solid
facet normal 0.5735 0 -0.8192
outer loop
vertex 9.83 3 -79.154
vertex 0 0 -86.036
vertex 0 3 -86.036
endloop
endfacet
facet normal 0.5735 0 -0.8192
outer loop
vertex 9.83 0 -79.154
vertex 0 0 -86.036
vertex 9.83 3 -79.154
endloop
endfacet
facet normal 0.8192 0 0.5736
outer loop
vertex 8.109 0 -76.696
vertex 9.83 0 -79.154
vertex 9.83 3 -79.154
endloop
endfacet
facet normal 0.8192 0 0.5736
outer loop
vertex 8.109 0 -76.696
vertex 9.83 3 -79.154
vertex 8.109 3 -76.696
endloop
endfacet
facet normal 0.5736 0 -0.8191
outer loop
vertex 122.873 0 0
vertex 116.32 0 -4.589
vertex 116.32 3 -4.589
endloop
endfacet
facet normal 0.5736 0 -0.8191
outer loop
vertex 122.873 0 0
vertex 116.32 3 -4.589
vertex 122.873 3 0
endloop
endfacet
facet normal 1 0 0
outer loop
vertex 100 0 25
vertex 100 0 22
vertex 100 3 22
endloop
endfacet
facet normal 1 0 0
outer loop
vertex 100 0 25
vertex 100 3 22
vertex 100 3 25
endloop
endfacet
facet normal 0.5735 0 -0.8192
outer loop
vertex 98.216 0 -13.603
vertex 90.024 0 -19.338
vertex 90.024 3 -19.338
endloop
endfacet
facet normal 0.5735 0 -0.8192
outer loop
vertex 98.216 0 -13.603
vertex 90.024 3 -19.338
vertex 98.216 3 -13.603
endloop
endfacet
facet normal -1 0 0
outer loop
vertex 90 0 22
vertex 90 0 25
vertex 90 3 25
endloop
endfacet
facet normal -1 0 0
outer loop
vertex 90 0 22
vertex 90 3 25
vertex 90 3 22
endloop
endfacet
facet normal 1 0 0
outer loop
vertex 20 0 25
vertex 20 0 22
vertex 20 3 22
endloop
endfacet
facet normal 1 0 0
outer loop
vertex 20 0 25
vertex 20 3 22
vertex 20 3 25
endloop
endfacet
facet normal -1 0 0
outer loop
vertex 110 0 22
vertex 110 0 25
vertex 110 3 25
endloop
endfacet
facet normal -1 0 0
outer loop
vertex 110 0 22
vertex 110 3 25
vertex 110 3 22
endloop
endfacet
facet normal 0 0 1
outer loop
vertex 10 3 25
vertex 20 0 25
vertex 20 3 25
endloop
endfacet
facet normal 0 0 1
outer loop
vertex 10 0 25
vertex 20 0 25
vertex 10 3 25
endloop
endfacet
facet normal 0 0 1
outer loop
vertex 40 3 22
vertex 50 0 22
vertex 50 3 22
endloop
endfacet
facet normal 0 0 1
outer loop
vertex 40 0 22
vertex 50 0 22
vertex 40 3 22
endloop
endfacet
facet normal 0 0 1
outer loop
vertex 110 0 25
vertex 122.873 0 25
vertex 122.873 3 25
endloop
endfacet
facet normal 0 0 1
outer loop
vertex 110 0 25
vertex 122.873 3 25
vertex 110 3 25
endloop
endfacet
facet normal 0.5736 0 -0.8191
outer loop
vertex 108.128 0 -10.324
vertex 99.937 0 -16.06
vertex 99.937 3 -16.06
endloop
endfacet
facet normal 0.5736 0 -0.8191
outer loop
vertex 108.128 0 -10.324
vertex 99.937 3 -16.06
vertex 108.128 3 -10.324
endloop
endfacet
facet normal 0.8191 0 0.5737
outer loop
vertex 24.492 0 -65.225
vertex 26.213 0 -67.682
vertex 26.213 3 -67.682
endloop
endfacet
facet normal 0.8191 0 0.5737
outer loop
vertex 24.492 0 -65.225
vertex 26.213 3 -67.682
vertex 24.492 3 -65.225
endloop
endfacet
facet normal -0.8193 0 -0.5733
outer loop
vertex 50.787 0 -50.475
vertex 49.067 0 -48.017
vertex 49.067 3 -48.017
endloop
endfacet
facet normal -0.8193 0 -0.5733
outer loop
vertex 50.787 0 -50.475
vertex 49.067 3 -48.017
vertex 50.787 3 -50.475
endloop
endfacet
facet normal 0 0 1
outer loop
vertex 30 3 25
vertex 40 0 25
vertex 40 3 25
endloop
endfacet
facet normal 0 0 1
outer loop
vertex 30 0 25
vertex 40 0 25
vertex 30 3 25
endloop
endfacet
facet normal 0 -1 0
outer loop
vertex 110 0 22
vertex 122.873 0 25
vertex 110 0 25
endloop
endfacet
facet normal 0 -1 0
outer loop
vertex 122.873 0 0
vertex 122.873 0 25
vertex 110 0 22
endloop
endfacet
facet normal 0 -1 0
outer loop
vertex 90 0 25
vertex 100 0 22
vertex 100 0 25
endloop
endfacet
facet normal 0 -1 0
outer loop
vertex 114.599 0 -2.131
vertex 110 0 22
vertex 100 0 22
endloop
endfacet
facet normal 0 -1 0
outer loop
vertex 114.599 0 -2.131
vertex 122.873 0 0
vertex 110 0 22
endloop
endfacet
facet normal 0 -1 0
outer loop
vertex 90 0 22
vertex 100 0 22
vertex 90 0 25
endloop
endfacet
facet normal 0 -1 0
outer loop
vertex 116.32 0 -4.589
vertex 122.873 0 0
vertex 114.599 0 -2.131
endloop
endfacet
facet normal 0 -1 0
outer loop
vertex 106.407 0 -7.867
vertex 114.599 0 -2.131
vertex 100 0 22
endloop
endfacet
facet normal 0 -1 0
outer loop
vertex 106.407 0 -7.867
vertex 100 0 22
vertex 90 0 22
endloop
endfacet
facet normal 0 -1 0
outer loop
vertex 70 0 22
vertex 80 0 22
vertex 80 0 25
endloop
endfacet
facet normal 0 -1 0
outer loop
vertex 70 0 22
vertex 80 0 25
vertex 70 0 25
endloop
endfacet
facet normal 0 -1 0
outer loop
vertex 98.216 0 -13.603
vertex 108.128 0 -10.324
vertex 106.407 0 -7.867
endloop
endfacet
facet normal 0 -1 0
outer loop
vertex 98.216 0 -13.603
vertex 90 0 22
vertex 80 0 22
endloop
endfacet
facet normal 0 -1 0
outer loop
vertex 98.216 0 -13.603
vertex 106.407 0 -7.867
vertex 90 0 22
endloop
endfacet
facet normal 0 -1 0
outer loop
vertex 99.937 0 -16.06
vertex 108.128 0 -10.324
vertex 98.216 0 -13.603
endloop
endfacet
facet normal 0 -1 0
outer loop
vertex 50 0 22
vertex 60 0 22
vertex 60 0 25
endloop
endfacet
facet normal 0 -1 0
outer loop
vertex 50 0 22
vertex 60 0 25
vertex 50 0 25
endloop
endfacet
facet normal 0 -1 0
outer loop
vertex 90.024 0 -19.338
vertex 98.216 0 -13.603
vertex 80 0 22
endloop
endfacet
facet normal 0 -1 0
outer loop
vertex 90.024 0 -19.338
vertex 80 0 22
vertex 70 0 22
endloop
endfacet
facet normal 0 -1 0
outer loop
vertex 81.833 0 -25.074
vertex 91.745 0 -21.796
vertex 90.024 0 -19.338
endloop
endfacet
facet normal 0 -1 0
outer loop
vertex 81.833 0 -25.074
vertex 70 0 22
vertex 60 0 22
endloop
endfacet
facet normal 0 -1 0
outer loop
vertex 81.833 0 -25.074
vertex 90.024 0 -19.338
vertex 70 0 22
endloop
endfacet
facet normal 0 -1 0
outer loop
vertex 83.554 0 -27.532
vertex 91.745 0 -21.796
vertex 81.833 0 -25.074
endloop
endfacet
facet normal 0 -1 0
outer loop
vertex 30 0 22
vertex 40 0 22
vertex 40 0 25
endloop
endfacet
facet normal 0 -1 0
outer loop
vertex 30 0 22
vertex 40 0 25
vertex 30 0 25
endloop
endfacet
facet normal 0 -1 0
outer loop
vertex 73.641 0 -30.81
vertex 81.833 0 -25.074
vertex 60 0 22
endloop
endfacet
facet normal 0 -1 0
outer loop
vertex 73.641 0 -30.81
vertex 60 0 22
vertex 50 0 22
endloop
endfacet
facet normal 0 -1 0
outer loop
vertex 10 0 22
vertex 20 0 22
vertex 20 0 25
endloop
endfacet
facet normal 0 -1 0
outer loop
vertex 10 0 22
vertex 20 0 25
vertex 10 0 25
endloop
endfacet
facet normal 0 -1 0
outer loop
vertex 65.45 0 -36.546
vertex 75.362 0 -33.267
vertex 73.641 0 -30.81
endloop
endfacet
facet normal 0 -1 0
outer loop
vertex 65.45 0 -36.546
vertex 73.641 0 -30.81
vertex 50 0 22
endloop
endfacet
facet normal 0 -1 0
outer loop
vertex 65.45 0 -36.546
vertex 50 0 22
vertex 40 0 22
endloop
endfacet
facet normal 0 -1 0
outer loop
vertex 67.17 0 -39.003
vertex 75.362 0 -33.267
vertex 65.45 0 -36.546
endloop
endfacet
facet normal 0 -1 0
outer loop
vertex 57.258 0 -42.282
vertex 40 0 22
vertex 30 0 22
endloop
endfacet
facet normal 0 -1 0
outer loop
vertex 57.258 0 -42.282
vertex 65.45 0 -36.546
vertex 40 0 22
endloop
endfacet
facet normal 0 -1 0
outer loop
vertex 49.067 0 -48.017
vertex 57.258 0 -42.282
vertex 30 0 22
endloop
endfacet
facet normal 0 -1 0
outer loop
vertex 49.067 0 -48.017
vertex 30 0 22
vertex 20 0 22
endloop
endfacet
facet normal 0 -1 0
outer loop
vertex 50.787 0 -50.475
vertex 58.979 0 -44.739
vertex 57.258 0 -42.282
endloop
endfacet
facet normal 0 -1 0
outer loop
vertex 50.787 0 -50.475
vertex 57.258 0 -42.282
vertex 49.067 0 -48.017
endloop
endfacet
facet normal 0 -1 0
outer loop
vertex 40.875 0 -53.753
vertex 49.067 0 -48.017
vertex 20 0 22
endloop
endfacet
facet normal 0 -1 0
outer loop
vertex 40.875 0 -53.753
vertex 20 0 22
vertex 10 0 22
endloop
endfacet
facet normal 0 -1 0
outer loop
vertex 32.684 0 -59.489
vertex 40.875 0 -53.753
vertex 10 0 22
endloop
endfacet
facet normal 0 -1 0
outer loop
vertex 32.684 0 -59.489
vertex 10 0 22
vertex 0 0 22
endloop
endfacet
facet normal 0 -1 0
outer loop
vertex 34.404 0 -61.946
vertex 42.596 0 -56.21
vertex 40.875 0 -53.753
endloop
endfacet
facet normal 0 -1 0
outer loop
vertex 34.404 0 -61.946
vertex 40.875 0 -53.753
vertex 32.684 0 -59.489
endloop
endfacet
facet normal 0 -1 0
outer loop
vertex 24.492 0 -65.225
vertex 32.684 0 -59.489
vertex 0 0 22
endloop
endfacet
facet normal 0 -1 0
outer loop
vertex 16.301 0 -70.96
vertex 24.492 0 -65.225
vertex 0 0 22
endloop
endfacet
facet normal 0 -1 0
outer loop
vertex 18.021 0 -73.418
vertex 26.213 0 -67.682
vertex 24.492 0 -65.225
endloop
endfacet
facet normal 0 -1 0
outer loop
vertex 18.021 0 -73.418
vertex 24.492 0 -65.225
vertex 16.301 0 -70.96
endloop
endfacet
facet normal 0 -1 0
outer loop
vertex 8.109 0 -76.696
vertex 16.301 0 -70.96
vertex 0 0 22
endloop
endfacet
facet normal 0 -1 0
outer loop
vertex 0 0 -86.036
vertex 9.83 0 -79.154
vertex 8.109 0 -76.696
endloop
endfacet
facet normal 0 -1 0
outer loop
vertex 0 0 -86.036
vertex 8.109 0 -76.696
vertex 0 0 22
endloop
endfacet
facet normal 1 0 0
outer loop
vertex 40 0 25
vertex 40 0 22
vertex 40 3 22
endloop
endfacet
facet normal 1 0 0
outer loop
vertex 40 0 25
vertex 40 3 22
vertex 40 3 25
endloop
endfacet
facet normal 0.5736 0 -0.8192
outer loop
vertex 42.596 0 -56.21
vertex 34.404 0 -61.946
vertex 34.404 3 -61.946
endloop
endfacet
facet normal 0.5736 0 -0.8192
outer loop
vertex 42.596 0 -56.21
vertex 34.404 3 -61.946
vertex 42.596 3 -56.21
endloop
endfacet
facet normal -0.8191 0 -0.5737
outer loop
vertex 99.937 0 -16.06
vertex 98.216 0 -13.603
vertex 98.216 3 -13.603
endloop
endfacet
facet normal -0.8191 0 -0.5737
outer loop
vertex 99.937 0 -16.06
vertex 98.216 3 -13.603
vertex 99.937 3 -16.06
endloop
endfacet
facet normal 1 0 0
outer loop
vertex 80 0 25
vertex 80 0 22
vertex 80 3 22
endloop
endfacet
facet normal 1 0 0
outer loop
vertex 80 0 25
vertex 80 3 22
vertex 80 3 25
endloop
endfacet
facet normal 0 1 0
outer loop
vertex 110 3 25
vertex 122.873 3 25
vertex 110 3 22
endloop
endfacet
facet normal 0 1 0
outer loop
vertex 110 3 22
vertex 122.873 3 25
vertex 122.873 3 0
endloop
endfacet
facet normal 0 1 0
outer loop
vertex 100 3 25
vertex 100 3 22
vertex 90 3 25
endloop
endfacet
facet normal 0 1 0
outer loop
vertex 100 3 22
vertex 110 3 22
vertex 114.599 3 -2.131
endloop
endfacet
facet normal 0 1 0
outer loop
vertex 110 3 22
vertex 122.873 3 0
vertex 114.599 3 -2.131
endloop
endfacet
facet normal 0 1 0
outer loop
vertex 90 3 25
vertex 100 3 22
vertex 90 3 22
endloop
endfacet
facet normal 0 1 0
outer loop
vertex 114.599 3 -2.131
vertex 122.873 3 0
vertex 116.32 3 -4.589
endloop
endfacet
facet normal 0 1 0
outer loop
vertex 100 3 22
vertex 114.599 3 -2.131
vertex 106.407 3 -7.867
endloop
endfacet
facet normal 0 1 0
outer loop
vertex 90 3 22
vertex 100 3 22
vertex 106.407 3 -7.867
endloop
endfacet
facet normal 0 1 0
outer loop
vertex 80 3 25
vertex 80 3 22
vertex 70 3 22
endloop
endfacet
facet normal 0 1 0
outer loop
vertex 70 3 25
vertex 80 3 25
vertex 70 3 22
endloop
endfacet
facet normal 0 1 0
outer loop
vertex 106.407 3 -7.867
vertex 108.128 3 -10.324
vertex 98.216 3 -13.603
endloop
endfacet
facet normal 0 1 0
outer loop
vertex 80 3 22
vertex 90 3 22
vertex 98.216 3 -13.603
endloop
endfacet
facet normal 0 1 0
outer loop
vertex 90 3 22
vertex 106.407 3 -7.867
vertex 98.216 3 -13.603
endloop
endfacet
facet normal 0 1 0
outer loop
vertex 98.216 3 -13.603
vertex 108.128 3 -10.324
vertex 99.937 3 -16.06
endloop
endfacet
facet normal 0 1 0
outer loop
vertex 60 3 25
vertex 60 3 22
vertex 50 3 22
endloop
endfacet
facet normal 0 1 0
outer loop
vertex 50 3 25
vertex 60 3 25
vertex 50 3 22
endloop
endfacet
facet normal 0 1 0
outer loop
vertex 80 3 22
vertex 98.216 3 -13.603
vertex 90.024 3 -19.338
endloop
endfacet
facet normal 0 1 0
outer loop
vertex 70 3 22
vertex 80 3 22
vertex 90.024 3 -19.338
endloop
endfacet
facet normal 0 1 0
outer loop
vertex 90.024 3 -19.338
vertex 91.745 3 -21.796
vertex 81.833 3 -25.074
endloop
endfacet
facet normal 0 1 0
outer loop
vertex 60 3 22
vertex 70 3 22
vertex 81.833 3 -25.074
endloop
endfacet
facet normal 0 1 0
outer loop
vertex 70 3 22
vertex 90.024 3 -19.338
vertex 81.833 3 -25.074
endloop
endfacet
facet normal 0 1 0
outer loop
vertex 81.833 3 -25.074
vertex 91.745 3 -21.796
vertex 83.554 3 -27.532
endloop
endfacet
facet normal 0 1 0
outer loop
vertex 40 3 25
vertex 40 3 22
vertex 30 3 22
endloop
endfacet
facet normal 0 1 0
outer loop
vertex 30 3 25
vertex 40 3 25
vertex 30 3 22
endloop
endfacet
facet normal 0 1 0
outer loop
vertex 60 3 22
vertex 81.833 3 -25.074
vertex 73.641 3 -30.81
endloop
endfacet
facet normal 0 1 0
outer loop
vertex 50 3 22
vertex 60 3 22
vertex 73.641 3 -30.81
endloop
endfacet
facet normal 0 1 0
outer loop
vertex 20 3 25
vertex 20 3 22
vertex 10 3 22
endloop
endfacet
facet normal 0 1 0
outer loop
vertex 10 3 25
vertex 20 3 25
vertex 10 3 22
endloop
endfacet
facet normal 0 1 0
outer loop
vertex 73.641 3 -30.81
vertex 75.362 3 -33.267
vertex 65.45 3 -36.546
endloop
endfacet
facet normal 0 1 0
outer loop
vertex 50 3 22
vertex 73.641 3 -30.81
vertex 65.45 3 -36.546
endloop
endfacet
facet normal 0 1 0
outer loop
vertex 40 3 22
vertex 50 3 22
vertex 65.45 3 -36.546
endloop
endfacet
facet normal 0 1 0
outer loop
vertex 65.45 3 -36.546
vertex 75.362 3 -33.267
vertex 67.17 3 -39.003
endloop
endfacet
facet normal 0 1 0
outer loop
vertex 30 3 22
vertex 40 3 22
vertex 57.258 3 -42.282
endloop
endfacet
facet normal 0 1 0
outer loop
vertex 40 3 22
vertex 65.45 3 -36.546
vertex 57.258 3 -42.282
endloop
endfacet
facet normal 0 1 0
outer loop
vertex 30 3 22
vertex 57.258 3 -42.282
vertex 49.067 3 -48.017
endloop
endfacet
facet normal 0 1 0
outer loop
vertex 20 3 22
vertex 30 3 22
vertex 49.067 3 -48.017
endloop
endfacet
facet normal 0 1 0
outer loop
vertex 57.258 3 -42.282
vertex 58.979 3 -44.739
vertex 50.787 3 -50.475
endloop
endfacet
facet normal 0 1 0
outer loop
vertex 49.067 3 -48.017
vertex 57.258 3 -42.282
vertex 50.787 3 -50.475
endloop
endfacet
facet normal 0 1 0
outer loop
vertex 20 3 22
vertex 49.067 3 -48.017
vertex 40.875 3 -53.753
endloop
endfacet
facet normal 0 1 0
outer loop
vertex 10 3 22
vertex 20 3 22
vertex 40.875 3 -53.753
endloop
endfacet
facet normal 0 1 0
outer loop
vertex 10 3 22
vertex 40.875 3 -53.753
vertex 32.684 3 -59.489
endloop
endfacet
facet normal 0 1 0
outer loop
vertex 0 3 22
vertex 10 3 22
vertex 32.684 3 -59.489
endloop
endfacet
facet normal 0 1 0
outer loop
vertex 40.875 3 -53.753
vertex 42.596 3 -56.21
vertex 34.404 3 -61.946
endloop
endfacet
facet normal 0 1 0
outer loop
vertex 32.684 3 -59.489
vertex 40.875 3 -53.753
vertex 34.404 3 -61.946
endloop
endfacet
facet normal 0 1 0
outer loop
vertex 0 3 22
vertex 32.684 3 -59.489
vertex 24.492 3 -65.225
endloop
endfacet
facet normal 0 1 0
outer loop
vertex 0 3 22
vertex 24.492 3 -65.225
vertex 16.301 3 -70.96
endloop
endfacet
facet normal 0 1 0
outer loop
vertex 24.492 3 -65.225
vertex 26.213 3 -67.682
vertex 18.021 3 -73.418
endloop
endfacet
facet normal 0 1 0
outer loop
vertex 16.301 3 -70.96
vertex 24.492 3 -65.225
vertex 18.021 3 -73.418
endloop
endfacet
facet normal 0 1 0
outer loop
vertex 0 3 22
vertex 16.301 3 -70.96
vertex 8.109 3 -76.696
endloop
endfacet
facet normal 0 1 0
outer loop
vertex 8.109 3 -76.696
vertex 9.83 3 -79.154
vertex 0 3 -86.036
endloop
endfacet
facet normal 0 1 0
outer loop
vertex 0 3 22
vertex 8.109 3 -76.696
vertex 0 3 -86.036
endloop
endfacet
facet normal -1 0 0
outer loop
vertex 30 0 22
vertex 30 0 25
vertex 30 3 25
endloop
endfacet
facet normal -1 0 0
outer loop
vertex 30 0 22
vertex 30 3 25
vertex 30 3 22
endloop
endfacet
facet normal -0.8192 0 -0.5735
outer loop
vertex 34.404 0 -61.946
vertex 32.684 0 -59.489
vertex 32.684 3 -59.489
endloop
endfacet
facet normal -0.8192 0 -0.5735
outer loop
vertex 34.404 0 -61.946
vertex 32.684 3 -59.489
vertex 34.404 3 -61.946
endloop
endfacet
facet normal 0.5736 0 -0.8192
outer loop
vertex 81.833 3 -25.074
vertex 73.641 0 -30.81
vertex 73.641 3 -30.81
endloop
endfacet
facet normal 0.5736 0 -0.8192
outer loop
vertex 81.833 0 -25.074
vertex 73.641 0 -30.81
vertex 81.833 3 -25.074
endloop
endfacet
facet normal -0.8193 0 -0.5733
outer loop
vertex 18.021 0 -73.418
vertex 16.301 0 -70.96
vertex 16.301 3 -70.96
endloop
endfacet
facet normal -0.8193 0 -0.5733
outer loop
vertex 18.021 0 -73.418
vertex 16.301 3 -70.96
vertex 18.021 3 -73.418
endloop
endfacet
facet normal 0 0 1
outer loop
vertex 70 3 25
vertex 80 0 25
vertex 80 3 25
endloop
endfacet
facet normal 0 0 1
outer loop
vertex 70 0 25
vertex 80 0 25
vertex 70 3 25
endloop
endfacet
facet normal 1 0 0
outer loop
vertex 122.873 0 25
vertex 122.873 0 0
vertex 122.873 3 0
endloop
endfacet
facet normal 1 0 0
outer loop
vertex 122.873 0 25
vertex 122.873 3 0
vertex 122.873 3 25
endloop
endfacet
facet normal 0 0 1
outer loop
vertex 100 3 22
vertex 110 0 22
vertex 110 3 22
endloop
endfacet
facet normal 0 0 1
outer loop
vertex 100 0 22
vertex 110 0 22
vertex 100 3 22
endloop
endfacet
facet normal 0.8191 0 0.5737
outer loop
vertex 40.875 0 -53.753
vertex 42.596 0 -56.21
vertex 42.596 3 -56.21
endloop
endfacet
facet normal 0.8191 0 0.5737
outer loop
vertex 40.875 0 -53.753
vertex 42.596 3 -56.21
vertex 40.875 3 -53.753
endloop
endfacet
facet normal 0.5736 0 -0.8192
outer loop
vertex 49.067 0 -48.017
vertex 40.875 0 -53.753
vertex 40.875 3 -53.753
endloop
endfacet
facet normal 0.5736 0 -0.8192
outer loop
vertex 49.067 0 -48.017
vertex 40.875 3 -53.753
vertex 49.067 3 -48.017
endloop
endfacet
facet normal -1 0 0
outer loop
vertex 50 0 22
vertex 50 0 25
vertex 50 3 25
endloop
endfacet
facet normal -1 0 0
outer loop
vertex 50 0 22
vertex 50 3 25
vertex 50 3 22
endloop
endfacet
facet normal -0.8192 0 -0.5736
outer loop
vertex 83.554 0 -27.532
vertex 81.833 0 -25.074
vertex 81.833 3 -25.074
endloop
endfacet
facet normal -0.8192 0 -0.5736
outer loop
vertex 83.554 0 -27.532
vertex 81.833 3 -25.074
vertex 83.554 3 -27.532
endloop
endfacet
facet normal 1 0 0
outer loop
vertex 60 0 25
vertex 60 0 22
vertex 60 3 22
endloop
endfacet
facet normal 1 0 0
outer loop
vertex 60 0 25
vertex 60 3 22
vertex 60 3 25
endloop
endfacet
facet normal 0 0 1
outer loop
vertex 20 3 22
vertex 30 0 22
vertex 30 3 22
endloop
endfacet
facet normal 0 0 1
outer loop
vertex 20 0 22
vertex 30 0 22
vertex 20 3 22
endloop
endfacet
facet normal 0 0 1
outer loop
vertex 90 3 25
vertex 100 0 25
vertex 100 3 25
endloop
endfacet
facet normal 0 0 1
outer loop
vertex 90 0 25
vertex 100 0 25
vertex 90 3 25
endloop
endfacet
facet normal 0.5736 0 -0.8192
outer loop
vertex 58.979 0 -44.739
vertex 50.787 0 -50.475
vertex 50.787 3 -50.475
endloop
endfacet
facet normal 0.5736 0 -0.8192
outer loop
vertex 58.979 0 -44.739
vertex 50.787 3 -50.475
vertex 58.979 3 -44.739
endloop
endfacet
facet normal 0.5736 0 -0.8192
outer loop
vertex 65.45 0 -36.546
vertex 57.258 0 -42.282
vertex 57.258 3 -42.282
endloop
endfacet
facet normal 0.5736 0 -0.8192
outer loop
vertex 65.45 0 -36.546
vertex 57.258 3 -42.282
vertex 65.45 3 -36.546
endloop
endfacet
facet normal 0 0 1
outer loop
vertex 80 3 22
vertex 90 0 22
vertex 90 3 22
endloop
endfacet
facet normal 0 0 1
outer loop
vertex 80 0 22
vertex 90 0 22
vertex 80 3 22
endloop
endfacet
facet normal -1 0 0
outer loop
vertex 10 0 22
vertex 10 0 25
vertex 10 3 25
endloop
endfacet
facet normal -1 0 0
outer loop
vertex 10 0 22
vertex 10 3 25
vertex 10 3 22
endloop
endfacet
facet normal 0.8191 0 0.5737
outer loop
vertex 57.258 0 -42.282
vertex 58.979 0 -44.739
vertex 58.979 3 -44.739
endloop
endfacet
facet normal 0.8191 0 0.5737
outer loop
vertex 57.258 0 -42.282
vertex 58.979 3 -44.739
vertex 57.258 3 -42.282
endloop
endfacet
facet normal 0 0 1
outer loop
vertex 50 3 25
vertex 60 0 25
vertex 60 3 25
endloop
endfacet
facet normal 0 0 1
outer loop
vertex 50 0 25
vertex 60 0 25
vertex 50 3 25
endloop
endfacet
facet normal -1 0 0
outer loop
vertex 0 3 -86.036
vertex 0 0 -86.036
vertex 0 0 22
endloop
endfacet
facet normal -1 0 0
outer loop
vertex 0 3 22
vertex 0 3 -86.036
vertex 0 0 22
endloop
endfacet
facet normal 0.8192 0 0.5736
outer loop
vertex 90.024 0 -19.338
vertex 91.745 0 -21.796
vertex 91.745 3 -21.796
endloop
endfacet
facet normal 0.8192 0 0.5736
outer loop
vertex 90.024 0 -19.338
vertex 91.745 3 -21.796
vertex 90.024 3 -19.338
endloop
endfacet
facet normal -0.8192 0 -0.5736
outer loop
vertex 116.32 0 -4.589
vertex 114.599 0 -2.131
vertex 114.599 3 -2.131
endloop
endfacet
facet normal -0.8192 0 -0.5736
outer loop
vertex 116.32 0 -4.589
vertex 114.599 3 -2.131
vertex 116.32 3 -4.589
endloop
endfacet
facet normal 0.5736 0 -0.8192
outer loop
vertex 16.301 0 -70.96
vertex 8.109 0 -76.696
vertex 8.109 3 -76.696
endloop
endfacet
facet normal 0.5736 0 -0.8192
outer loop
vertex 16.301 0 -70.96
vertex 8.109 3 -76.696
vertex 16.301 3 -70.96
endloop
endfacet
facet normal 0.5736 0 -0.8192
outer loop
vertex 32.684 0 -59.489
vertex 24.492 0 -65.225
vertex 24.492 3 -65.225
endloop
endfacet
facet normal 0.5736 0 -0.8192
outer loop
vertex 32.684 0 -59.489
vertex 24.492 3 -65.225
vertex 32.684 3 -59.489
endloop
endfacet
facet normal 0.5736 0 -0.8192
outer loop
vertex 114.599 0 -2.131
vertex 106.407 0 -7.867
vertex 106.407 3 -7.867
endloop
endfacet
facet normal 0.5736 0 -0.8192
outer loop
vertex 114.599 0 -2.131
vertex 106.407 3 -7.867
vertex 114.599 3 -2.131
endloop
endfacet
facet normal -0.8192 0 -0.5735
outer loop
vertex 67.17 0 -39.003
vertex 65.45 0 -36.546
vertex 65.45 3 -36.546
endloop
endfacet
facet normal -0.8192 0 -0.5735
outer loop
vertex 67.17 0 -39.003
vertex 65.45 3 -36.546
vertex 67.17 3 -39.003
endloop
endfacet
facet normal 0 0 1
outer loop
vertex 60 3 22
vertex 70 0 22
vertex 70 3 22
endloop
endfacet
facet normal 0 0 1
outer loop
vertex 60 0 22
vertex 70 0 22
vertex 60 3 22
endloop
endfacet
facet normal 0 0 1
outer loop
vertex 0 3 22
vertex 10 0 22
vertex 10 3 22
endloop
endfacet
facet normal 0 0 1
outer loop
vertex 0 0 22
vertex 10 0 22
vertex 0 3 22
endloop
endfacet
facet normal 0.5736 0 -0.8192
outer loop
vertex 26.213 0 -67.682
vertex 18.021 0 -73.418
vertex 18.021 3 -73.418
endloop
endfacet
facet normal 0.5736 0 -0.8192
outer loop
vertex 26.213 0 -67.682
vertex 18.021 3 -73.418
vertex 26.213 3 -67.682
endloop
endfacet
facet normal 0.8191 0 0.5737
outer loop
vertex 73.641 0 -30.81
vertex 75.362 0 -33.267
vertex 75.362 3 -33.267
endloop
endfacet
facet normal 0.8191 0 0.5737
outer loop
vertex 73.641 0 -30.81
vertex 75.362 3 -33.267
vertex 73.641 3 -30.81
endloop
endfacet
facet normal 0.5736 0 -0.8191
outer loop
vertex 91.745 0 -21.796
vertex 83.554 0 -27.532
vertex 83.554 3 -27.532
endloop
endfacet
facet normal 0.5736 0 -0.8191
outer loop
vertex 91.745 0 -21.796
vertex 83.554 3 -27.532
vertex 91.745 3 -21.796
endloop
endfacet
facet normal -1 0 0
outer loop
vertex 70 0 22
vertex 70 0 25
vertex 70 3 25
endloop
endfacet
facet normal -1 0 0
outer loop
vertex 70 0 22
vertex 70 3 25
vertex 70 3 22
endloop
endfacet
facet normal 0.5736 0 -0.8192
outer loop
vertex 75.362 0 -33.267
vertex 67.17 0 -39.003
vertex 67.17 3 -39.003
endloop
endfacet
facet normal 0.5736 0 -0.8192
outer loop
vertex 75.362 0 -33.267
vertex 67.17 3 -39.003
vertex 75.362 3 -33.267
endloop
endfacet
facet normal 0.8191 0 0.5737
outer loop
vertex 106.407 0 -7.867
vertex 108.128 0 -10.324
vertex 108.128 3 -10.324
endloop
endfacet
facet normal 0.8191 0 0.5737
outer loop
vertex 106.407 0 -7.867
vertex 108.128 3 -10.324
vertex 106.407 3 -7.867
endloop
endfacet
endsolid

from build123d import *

# Parameters (mm, degrees)
BOSS_EXTRU_1_DEPTH = 3


with BuildPart() as part:
    # Esquisse1 → Boss.-Extru.1 (new body)
    with BuildSketch(Plane(origin=(0, 0, 0), x_dir=(1, 0, 0), z_dir=(0, 1, 0))):
        Polygon((0, 0), (0, 86.036465453), (9.829824531, 79.153548216), (8.109095222, 76.696092084), (16.300615665, 70.96032772), (18.021344974, 73.417783853), (26.212865417, 67.682019489), (24.492136108, 65.224563357), (32.683656551, 59.488798993), (34.40438586, 61.946255126), (42.595906303, 56.210490762), (40.875176994, 53.75303463), (49.066697437, 48.017270266), (50.787426746, 50.474726399), (58.978947189, 44.738962035), (57.25821788, 42.281505903), (65.449738323, 36.545741539), (67.170467632, 39.003197672), (75.361988075, 33.267433308), (73.641258766, 30.809977175), (81.832779208, 25.074212812), (83.553508517, 27.531668945), (91.74502896, 21.795904581), (90.024299651, 19.338448448), (98.215820094, 13.602684085), (99.936549403, 16.060140218), (108.128069846, 10.324375854), (106.407340537, 7.866919721), (114.59886098, 2.131155358), (116.319590289, 4.588611491), (122.872806643, 0), (122.872806643, -25), (110, -25), (110, -22), (100, -22), (100, -25), (90, -25), (90, -22), (80, -22), (80, -25), (70, -25), (70, -22), (60, -22), (60, -25), (50, -25), (50, -22), (40, -22), (40, -25), (30, -25), (30, -22), (20, -22), (20, -25), (10, -25), (10, -22), (0, -22), align=None)
    extrude(amount=BOSS_EXTRU_1_DEPTH)


solid = part.part
